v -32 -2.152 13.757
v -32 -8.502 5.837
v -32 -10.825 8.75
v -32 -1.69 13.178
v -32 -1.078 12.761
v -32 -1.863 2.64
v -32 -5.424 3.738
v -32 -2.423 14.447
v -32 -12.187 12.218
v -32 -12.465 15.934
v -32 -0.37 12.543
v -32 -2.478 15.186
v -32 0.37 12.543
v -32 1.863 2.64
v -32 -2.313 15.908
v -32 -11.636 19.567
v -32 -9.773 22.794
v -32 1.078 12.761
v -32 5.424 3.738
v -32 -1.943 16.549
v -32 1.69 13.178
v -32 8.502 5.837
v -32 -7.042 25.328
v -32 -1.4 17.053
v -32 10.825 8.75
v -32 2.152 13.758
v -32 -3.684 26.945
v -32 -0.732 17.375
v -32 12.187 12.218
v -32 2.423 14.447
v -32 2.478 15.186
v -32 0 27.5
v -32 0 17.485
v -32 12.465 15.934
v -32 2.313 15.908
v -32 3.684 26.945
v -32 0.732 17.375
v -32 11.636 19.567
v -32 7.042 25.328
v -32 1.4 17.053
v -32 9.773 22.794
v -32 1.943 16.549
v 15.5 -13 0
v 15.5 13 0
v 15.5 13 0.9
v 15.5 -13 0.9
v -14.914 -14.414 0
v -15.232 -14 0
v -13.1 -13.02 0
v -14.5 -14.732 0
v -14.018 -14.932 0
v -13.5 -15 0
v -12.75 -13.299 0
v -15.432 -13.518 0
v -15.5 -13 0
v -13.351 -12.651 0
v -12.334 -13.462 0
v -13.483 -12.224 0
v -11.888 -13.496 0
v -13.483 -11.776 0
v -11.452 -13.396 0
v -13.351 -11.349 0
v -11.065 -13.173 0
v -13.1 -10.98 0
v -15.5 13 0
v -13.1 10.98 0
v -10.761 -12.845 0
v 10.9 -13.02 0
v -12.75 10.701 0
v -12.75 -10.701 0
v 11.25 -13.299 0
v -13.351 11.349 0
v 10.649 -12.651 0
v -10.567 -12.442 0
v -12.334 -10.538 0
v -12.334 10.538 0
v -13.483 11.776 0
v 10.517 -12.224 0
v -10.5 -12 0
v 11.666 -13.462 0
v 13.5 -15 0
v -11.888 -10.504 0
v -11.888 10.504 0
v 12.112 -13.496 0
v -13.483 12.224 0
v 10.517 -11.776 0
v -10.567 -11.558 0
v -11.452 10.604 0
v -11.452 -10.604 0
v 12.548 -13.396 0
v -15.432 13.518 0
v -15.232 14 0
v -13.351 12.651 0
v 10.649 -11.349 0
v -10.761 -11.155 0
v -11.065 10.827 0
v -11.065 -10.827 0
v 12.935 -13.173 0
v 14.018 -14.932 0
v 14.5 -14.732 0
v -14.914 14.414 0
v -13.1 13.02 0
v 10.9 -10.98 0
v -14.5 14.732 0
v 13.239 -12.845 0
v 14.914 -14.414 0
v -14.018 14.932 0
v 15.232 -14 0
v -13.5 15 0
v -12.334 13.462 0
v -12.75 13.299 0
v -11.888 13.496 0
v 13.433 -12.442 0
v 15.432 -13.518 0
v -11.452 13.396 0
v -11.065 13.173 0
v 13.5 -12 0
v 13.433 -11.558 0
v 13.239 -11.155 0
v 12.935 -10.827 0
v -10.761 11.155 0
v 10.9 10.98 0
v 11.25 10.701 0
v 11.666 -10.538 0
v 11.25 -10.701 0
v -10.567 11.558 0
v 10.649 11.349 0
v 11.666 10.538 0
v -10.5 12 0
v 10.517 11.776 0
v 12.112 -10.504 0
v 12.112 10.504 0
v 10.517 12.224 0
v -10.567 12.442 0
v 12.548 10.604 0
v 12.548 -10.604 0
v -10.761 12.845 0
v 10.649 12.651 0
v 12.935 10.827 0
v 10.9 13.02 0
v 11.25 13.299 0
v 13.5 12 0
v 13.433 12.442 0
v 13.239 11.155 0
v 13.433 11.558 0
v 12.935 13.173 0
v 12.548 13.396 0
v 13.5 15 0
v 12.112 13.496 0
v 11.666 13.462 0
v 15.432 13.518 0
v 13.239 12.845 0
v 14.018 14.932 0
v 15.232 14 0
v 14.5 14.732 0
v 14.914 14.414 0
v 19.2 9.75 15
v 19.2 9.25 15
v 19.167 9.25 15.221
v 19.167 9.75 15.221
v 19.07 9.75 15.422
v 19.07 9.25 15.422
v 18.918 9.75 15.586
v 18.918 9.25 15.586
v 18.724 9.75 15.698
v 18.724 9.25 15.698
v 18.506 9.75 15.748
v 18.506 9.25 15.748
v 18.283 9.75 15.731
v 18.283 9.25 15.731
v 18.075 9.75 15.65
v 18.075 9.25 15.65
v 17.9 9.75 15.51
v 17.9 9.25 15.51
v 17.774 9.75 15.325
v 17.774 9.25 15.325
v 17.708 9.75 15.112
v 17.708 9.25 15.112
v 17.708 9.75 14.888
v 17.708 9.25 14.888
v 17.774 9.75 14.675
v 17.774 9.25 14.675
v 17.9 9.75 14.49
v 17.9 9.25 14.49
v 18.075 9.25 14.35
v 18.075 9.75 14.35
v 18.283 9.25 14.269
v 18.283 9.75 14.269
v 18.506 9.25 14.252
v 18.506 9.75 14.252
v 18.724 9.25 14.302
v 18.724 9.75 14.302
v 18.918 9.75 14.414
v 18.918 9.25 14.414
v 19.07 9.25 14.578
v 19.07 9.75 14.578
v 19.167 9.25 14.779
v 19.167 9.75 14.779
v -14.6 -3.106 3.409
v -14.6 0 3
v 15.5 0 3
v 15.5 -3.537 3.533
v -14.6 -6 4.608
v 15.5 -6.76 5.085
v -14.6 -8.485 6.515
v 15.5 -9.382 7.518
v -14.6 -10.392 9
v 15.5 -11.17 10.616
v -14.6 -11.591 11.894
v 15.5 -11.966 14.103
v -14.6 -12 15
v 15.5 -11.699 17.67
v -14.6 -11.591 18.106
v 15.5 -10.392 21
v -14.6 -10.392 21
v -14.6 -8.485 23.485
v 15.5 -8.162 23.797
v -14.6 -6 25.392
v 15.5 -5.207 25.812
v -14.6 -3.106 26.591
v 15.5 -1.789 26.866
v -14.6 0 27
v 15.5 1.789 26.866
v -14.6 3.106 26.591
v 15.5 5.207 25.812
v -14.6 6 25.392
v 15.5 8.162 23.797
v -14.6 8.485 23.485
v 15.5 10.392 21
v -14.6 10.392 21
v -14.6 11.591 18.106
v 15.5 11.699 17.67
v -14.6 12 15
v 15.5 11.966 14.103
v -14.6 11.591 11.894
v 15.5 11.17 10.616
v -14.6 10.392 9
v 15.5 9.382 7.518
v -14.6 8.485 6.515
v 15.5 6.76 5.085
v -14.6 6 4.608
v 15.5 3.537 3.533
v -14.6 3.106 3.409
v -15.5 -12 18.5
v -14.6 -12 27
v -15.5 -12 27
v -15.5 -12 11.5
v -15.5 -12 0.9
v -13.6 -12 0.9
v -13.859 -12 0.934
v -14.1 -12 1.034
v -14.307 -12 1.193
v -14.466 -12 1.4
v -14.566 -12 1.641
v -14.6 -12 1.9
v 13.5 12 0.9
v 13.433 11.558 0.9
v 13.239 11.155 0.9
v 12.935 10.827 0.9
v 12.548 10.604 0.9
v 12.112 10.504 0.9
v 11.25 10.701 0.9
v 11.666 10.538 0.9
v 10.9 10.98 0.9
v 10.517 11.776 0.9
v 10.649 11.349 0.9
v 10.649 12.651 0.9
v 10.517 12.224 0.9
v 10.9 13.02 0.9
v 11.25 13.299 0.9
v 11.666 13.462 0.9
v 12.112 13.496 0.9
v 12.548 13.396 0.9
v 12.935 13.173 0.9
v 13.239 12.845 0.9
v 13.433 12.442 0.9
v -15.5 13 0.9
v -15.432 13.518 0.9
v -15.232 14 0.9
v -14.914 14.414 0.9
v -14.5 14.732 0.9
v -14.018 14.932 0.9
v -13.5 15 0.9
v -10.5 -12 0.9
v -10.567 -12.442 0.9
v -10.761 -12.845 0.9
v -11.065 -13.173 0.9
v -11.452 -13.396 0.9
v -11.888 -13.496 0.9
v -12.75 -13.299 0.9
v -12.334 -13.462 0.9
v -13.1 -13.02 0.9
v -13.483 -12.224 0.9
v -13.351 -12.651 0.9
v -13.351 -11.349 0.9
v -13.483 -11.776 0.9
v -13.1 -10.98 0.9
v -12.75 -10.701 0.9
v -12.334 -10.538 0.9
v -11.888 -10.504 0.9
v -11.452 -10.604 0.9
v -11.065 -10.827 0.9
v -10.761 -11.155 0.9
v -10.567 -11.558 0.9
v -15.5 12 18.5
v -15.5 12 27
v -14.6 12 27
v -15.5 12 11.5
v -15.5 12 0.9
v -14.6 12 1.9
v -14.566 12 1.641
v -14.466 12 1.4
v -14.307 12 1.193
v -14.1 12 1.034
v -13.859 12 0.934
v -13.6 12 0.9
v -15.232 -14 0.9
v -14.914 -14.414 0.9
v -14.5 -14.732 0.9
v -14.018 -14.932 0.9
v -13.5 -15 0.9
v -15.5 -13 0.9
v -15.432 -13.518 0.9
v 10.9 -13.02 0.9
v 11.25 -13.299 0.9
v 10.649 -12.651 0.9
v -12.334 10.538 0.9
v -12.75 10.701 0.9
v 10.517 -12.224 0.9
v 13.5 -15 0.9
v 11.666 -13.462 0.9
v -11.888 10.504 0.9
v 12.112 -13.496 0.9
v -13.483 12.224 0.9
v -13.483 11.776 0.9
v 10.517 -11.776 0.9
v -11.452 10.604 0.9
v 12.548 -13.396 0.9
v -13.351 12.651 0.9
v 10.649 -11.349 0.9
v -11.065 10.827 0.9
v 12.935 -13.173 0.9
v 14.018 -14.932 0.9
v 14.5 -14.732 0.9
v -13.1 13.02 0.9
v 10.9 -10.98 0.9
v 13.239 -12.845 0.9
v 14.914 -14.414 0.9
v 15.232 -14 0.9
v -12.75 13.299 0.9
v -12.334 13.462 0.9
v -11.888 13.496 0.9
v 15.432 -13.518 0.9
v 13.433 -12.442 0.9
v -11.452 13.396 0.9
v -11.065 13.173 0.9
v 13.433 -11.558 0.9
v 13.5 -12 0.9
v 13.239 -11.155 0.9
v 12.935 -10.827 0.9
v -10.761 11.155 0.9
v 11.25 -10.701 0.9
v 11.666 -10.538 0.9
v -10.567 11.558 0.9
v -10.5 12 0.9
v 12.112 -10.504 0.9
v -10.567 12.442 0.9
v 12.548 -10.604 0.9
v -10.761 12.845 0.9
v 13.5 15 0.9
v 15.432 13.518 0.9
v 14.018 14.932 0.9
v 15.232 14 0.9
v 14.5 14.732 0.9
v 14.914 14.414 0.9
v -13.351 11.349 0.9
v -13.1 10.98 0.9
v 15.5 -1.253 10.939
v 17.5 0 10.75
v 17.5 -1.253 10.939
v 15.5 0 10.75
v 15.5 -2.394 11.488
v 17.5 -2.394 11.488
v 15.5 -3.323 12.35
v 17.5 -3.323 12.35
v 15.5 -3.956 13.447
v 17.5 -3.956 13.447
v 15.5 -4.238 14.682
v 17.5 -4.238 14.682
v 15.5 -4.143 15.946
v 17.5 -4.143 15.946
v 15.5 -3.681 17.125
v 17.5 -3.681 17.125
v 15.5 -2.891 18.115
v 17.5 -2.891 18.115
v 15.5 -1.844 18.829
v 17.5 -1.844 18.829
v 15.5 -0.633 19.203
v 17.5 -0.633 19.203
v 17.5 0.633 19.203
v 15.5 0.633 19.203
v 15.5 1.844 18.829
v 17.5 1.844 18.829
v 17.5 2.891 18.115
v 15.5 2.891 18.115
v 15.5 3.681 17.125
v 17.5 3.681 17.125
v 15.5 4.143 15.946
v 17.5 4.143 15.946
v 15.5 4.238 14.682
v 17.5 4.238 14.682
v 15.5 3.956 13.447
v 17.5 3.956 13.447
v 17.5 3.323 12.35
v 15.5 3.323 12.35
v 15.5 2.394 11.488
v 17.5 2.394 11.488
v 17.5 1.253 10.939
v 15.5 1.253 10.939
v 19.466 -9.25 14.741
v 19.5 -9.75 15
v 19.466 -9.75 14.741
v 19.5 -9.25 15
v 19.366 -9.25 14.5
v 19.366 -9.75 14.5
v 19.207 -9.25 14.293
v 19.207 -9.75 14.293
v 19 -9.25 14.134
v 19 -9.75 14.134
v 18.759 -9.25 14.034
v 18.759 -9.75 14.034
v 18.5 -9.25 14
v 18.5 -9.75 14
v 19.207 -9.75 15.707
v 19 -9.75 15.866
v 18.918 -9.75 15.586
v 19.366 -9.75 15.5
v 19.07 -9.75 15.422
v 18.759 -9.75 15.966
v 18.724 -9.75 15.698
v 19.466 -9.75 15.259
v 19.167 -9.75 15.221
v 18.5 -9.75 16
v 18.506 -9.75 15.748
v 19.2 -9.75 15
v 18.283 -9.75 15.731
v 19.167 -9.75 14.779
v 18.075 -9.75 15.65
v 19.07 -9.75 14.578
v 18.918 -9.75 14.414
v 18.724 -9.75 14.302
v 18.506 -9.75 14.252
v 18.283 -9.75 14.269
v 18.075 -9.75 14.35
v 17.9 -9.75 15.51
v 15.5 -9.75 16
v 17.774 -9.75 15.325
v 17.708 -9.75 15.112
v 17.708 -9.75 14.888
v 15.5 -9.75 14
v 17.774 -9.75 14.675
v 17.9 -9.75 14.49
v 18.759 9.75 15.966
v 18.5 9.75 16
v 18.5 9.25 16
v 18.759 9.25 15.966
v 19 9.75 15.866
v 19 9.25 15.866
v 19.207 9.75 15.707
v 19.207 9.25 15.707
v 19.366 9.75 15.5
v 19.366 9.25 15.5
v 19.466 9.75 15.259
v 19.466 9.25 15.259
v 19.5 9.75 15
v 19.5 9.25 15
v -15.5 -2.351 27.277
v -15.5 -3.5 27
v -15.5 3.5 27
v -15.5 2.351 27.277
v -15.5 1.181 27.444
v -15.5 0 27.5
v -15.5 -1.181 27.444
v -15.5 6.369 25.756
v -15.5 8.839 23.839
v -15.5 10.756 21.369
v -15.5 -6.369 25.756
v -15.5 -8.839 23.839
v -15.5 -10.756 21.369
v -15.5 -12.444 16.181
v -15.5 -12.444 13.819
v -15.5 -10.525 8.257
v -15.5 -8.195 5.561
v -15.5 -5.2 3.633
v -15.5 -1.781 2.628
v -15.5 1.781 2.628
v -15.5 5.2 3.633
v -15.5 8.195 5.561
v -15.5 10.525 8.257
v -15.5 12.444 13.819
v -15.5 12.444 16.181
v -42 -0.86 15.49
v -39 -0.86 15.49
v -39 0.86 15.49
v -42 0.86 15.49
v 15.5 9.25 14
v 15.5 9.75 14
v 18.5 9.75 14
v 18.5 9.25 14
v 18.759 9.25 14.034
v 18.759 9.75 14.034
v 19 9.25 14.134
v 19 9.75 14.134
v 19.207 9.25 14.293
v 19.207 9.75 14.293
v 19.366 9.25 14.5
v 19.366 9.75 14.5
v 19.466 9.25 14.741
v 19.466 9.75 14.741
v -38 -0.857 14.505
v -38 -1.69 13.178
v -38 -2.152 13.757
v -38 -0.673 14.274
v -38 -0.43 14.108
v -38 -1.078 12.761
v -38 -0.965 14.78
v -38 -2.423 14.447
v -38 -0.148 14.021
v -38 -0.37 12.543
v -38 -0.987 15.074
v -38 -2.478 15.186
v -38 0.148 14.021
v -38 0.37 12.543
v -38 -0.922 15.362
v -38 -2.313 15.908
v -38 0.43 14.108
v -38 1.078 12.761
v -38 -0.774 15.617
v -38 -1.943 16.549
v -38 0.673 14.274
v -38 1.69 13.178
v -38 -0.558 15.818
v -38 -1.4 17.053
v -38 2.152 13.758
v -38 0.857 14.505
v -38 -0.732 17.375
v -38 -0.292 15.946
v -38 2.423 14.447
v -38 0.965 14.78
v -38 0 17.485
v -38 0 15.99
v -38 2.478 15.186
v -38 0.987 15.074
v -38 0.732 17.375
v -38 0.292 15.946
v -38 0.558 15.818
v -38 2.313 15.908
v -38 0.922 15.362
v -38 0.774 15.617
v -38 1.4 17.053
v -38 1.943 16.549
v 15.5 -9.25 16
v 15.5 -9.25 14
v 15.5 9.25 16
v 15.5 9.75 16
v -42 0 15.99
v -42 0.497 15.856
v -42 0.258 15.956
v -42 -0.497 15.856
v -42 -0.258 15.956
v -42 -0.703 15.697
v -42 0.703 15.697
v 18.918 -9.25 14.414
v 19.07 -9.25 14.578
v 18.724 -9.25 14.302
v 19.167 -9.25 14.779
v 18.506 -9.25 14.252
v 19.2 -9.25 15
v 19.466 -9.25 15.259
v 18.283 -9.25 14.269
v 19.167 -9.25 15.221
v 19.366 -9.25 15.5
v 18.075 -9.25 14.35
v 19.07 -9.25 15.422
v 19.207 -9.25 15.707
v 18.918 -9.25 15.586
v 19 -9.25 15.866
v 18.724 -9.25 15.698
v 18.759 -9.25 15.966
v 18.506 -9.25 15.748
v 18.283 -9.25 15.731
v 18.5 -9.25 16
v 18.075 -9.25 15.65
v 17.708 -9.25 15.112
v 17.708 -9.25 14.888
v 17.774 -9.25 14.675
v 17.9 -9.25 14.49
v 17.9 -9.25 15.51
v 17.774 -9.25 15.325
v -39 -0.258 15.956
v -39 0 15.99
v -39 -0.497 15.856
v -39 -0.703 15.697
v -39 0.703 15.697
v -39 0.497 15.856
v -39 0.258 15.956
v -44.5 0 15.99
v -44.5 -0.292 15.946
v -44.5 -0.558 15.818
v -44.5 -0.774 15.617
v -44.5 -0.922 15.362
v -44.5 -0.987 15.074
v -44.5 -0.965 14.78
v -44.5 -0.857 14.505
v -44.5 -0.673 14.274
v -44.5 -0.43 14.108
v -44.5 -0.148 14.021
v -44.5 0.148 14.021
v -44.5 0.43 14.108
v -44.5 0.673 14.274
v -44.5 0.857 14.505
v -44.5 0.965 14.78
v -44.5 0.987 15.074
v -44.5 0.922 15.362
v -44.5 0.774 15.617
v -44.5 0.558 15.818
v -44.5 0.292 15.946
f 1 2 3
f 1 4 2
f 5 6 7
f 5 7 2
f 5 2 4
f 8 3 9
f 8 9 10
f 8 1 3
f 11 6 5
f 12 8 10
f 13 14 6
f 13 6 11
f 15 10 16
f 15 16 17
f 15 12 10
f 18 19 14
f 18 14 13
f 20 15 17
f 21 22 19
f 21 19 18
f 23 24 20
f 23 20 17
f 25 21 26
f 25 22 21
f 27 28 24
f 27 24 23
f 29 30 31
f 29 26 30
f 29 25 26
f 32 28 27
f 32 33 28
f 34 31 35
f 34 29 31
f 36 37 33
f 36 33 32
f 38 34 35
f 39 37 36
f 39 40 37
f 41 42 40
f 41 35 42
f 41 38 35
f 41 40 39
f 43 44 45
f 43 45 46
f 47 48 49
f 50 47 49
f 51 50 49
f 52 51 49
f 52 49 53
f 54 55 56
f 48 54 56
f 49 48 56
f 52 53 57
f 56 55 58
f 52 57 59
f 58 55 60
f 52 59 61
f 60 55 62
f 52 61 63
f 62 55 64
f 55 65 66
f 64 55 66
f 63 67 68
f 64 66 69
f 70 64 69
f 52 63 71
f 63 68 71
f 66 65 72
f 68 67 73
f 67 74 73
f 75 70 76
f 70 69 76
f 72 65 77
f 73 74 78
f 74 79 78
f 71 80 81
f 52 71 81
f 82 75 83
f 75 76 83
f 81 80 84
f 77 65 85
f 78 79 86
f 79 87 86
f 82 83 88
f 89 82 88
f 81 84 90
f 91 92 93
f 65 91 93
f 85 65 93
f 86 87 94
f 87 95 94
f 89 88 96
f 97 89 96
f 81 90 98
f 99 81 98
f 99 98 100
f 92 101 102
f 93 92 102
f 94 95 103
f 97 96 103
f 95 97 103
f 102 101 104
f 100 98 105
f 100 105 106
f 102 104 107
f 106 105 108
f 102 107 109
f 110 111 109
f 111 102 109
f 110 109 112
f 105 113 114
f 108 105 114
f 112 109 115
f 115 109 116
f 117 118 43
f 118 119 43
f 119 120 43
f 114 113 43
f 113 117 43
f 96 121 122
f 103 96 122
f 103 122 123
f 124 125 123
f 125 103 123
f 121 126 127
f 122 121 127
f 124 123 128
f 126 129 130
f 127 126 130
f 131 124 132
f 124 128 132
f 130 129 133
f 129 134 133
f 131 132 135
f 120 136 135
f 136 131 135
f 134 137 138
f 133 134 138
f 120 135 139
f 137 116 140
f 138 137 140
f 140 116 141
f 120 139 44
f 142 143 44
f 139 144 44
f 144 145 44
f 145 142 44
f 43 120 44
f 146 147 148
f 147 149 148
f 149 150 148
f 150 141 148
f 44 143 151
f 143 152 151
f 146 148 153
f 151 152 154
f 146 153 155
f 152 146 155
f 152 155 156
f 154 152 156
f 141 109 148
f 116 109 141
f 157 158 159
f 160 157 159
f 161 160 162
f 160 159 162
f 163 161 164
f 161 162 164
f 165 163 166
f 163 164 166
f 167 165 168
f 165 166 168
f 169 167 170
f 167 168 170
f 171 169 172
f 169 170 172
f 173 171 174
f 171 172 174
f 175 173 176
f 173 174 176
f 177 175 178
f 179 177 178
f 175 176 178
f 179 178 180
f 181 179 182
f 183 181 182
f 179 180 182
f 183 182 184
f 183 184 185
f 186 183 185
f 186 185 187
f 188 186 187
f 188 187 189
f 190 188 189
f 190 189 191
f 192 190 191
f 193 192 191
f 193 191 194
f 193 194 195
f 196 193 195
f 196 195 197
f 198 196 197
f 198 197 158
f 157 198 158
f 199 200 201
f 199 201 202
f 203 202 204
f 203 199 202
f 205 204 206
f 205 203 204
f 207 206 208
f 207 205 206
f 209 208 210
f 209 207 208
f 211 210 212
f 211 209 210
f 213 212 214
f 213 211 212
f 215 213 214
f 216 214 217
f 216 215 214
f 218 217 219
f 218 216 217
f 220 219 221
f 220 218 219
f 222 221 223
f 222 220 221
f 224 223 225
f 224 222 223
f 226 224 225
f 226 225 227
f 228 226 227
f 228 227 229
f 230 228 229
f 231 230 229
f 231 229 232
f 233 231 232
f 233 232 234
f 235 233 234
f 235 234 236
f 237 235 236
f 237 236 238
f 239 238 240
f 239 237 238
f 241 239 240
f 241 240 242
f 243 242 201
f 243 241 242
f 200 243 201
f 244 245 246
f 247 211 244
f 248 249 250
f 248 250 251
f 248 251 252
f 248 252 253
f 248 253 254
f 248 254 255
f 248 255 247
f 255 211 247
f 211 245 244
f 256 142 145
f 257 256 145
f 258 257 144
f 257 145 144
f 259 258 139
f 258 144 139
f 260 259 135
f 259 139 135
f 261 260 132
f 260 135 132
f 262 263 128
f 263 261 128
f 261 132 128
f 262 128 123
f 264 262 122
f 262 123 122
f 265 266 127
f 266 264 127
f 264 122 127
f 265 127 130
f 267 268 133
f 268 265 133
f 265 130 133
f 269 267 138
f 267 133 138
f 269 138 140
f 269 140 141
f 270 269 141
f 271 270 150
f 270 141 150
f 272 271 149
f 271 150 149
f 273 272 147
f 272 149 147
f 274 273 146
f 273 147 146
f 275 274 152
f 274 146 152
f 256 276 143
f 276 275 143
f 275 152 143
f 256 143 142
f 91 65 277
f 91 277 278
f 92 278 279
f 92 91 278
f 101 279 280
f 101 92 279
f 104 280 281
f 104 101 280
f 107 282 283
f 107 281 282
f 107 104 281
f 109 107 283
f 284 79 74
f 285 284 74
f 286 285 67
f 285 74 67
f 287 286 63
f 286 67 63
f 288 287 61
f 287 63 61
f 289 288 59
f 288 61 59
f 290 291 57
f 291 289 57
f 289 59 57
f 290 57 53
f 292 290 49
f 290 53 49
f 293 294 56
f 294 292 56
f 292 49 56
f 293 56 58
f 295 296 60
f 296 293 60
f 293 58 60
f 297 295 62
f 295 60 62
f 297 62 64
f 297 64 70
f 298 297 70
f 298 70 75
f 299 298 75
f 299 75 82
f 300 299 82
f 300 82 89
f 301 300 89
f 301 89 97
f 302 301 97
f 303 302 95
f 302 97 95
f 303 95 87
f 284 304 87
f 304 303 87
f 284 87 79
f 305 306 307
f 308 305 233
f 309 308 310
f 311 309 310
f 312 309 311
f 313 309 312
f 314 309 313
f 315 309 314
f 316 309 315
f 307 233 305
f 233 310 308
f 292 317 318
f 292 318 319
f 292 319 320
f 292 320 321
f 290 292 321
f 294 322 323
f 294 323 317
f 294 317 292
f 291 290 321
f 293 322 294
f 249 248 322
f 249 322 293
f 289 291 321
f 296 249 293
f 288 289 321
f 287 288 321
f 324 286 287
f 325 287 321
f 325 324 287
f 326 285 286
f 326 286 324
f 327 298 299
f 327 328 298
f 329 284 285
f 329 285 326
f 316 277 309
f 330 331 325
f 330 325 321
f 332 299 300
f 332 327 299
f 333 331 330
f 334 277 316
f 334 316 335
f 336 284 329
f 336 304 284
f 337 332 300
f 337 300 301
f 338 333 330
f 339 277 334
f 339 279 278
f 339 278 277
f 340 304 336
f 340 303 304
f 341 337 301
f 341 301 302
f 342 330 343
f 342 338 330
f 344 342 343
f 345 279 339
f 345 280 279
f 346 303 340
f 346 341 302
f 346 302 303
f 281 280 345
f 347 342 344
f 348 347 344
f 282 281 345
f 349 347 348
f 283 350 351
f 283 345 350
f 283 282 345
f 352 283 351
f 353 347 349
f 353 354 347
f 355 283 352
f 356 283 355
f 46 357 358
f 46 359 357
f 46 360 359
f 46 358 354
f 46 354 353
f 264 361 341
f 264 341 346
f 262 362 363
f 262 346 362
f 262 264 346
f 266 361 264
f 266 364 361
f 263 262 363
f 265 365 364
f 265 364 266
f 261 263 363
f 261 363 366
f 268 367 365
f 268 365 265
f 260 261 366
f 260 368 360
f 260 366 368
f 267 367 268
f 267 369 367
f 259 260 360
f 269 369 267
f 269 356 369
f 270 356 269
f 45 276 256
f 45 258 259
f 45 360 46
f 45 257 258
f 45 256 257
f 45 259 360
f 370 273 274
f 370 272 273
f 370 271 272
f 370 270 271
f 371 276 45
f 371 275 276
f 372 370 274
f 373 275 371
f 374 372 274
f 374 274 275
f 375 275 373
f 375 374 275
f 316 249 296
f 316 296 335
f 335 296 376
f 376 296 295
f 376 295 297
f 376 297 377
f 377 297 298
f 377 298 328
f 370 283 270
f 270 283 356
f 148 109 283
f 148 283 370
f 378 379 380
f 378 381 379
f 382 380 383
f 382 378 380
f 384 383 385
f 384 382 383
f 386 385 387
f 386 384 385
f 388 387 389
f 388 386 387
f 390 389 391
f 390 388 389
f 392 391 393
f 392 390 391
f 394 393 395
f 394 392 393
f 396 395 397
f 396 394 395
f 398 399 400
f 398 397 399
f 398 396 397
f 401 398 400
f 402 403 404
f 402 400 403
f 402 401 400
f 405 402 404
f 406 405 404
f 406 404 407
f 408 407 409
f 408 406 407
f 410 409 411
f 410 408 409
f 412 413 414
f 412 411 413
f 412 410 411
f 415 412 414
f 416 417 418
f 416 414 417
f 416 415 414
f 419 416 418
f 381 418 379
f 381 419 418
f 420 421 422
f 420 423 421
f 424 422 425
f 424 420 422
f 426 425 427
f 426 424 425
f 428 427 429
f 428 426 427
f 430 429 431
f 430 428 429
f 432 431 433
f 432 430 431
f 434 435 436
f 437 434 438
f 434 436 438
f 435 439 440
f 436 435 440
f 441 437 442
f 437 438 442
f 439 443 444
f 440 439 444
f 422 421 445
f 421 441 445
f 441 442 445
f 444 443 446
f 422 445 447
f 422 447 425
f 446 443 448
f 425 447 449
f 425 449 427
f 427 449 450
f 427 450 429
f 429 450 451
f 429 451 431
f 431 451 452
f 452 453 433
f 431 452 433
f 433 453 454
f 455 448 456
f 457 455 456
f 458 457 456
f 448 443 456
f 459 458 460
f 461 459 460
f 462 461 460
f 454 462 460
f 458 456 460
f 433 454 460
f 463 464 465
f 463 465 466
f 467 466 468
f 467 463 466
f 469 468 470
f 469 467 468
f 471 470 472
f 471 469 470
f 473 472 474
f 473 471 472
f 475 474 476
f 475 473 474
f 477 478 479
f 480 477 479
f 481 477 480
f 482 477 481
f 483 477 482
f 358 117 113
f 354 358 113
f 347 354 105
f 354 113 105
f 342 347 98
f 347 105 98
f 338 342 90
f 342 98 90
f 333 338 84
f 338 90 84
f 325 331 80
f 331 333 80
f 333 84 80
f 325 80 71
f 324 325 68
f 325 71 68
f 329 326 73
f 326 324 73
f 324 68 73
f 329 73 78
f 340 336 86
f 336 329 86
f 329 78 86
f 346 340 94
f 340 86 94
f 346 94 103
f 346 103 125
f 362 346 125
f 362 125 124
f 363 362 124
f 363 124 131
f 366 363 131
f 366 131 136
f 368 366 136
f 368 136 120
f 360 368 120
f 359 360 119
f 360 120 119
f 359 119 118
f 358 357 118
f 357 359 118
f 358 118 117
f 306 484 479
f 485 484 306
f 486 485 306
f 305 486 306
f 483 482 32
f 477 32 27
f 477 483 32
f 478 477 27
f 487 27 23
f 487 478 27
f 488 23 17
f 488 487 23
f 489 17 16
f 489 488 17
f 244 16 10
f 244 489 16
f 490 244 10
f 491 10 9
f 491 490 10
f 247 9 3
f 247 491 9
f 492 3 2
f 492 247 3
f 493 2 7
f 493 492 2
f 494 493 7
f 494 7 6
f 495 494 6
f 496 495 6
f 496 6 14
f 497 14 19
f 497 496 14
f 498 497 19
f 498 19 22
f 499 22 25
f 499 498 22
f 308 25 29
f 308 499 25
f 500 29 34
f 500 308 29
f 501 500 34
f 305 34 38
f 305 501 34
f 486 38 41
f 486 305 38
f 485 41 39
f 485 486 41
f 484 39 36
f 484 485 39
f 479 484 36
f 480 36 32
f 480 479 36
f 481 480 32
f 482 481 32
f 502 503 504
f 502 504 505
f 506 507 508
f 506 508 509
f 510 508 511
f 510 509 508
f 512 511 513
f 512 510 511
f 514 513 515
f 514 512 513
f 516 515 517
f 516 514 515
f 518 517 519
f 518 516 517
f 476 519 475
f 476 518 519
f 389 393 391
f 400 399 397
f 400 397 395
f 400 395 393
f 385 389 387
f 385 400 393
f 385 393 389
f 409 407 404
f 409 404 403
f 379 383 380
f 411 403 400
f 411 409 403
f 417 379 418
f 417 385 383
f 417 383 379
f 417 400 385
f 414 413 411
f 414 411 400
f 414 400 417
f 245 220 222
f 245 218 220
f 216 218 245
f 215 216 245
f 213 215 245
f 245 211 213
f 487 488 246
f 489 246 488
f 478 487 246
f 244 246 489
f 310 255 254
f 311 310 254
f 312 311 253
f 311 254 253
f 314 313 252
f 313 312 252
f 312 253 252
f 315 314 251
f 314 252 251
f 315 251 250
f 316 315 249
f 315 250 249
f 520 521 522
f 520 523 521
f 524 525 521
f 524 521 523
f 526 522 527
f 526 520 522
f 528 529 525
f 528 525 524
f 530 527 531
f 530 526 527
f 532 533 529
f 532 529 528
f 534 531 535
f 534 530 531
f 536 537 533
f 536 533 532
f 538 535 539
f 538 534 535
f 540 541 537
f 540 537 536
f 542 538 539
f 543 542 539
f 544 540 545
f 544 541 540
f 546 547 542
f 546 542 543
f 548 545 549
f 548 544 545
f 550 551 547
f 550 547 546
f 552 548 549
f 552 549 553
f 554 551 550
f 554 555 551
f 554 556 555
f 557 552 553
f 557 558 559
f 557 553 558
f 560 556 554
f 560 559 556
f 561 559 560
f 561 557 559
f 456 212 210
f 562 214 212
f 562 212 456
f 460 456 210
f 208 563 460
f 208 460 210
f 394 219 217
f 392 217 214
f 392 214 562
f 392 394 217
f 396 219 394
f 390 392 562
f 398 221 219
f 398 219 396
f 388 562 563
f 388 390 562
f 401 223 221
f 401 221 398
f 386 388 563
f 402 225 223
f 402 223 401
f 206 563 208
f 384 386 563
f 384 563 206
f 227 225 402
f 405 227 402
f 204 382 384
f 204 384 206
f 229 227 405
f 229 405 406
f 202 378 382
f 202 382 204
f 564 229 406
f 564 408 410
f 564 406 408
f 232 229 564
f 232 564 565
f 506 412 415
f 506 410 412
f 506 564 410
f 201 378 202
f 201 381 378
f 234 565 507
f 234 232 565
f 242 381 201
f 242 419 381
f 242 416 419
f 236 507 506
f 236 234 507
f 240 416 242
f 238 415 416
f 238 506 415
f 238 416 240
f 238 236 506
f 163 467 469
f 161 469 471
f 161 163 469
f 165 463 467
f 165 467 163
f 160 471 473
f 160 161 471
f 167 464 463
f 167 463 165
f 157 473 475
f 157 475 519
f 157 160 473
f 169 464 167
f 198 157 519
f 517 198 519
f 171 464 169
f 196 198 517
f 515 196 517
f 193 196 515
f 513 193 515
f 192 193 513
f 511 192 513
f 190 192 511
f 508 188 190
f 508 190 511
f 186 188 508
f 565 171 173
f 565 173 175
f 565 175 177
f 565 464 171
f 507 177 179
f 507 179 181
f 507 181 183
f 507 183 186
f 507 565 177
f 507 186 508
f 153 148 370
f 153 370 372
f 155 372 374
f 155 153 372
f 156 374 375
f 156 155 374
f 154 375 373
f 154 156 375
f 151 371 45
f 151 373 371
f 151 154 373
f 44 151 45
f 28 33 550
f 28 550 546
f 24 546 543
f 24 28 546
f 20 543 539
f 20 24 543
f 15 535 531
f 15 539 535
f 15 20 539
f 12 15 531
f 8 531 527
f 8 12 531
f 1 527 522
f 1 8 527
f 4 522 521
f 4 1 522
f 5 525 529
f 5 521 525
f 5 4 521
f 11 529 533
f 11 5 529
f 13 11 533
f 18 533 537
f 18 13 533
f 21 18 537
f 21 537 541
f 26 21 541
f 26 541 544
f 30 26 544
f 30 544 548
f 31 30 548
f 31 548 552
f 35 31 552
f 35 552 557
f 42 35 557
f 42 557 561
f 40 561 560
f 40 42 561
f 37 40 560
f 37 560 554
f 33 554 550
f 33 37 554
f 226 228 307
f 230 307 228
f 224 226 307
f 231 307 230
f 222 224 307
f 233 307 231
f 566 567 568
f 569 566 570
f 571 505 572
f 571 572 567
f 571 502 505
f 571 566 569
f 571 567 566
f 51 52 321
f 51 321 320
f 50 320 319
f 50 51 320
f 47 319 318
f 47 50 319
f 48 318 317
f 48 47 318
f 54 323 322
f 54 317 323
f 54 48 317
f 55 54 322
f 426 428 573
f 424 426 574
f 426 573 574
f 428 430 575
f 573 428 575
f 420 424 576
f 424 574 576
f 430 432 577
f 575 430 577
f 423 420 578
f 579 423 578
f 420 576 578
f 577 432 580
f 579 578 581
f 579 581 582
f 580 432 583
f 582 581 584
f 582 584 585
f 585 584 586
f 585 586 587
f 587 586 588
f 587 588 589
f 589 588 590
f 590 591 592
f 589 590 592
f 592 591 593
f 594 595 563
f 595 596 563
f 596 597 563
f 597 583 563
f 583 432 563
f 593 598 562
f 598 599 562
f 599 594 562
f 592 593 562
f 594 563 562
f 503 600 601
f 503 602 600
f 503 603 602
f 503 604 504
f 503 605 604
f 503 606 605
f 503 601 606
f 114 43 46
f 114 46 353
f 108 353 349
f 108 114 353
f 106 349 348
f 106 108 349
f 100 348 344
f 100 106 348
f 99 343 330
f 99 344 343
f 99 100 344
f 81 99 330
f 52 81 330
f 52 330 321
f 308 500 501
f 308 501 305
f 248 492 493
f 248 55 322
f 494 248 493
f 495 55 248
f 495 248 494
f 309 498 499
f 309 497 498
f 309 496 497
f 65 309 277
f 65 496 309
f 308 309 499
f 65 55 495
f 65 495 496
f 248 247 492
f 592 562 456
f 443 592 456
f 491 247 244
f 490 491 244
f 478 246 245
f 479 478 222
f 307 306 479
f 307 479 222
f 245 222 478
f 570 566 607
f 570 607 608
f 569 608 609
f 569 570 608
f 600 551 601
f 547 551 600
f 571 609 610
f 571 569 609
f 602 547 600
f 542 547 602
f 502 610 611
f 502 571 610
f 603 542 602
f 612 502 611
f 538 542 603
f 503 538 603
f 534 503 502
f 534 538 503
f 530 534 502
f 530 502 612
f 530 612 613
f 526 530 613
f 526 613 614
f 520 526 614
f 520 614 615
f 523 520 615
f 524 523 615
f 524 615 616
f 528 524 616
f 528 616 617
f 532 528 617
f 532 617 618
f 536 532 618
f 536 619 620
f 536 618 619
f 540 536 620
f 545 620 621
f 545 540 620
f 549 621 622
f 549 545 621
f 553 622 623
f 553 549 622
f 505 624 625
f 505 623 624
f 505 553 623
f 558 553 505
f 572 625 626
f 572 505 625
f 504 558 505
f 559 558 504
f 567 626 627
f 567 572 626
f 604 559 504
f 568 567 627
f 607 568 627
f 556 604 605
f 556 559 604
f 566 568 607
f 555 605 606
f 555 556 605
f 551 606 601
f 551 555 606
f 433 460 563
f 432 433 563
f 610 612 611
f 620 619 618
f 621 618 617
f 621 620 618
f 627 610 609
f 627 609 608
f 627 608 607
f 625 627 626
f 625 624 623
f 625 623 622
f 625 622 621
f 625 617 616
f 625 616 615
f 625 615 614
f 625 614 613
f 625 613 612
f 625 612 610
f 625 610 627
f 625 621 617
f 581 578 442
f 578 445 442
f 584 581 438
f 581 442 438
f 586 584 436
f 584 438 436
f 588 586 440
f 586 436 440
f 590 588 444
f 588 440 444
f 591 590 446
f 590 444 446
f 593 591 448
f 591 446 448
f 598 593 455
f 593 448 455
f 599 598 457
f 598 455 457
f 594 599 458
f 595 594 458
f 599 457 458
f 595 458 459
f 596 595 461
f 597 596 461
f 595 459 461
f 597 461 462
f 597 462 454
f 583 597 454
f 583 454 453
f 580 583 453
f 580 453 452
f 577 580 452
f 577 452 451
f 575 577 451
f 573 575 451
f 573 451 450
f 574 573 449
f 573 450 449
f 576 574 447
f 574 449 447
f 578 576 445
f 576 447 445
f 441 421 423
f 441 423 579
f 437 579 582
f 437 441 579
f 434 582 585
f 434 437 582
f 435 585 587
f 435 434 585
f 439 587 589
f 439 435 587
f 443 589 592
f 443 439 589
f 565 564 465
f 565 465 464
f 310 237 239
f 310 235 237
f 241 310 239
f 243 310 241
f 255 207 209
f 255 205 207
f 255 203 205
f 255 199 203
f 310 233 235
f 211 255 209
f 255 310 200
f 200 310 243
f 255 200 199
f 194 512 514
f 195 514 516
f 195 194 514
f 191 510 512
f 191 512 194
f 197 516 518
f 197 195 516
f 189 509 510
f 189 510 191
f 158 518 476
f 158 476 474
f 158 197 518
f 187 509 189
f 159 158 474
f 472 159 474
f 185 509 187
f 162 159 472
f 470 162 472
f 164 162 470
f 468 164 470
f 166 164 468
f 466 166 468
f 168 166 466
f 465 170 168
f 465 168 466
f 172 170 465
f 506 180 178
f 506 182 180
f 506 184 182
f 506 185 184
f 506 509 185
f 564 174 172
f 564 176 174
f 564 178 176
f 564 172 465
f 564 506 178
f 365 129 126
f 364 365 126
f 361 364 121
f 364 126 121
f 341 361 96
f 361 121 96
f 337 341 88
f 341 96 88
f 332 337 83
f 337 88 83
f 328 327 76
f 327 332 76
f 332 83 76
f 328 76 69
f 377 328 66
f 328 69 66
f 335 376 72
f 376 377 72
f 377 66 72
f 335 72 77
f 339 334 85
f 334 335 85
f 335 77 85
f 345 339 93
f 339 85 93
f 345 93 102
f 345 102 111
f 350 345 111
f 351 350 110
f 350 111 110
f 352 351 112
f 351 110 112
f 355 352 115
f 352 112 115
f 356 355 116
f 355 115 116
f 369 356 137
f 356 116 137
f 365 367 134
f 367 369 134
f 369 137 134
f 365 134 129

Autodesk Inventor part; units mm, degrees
ref_plane "YZ Plane" through (0, 0, 0) normal (1, 0, 0) x (0, 1, 0)
ref_plane "XZ Plane" through (0, 0, 0) normal (0, 1, 0) x (-1, 0, 0)
ref_plane "XY Plane" through (0, 0, 0) normal (0, 0, 1) x (1, 0, 0)
sketch "Sketch1" plane through (0, 0, 0) normal (0, 0, 1) x (1, 0, 0)
  line L0 (-13.5, 15) -> (13.5, 15)
  line L1 (15.5, 13) -> (15.5, -13)
  line L2 (13.5, -15) -> (-13.5, -15)
  line L3 (-15.5, -13) -> (-15.5, 13)
  line L4 (-22.2799, 0) -> (22.2799, 0) projected
  line L5 (0, -21.5799) -> (0, 21.5799) projected
  circle A0 centre (-12, 12) radius 1.5
  arc A1 (-13.5, 15) -> (-15.5, 13) centre (-13.5, 13) ccw
  arc A2 (15.5, 13) -> (13.5, 15) centre (13.5, 13) ccw
  arc A3 (13.5, -15) -> (15.5, -13) centre (13.5, -13) ccw
  arc A4 (-15.5, -13) -> (-13.5, -15) centre (-13.5, -13) ccw
  circle A5 centre (12, 12) radius 1.5
  circle A6 centre (-12, -12) radius 1.5
  circle A7 centre (12, -12) radius 1.5
  point P0 (0, 0)
  point P1 (-15.5, 15)
  point P2 (15.5, -15)
  point P3 (15.5, 15)
  point P4 (13.5, 13)
  dimension "d0" = 31
  dimension "d1" = 30
  dimension "d2" = 15
  dimension "d3" = 15.5
  dimension "d4" = 3
  dimension "d5" = 12
  dimension "d6" = 12
  dimension "d7" = 2
extrude "Extrusion1" add sketch "Sketch1" along normal blind 0.9
sketch "Sketch2" plane through (0, 0, 0.9) normal (0, 0, 1) x (1, 0, 0)
  circle A0 centre (12, -12) radius 1.5 projected
  circle A1 centre (-12, -12) radius 1.5 projected
  circle A2 centre (12, 12) radius 1.5 projected
  circle A3 centre (-12, 12) radius 1.5 projected
  line L0 (13.5, 15) -> (-13.5, 15) projected
  arc A4 (-13.5, 15) -> (-15.5, 13) centre (-13.5, 13) ccw projected
  line L1 (-15.5, 13) -> (-15.5, -13) projected
  arc A5 (-15.5, -13) -> (-13.5, -15) centre (-13.5, -13) ccw projected
  line L2 (-13.5, -15) -> (13.5, -15) projected
  arc A6 (13.5, -15) -> (15.5, -13) centre (13.5, -13) ccw projected
  line L3 (15.5, -13) -> (15.5, 13) projected
  arc A7 (15.5, 13) -> (13.5, 15) centre (13.5, 13) ccw projected
  line L4 (-15.5, 12) -> (-14.6, 12)
  line L5 (-14.6, 12) -> (-14.6, -12)
  line L6 (-14.6, -12) -> (-15.5, -12)
  line L7 (-15.5, -12) -> (-15.5, 12)
  line L8 (-22.2799, 0) -> (22.2799, 0) projected
  line L9 (0, -21.5799) -> (0, 21.5799) projected
  point P0 (0, 0)
  dimension "d10" = 0.9
  dimension "d11" = 24
  dimension "d12" = 12
extrude "Extrusion2" add sketch "Sketch2" along normal blind 26.1 contours L8 L1 L4 L5 | L5 L6 L1 L8
fillet "Fillet1" radius 1 1 edges at (-14.6, 0, 0.9)
sketch "Sketch3" plane through (-14.6, -12, 27) normal (1, 0, 0) x (0, 0, -1)
  line L0 (27, -1) -> (27, 25) projected
  line L1 (27, -1) -> (26.1, -1) projected
  line L2 (26.1, 0) -> (26.1, -1) projected
  line L3 (26.1, 0) -> (0, 0) projected
  line L4 (0, 24) -> (0, 0) projected
  line L5 (26.1, 24) -> (0, 24) projected
  line L6 (26.1, 25) -> (26.1, 24) projected
  line L7 (27, 25) -> (26.1, 25) projected
  line L8 (35.3744, 12) -> (2.9643, 12) construction
  circle A0 centre (12, 12) radius 12
  point P0 (27, 12)
  dimension "d16" = 15
  dimension "d17" = 24
extrude "Extrusion3" add sketch "Sketch3" along normal blind 30.1 contours A0
sketch "Sketch4" plane through (-15.5, -13, 0) normal (-1, 0, 0) x (0, 0, 1)
  circle A0 centre (15, 13) radius 12 projected
  arc A1 (15, 25) -> (15, 1) centre (15, 13) ccw projected
  arc A2 (27, 13) -> (15, 25) centre (15, 13) ccw projected
  arc A3 (15, 1) -> (27, 13) centre (15, 13) ccw projected
  circle A4 centre (15, 13) radius 12.5
  point P0 (0, 13)
  dimension "d20" = 25
extrude "Extrusion4" add sketch "Sketch4" along normal blind 16.5 contours A0 | A4
sketch "Sketch5" plane through (15.5, 0, 15) normal (1, 0, 0) x (0, 0, -1)
  circle A0 centre (0, 0) radius 12 projected
  arc A1 (0, -12) -> (0, 12) centre (0, 0) ccw projected
  arc A2 (0, 12) -> (-12, 0) centre (0, 0) ccw projected
  arc A3 (-12, 0) -> (0, -12) centre (0, 0) ccw projected
  circle A4 centre (0, 0) radius 4.25
  point P0 (15, 0)
  dimension "d23" = 8.5
extrude "Extrusion5" add sketch "Sketch5" along normal blind 2 contours A4
sketch "Sketch6" plane through (15.5, 0, 15) normal (1, 0, 0) x (0, 0, -1)
  circle A0 centre (0, 0) radius 12 projected
  arc A1 (0, -12) -> (0, 12) centre (0, 0) ccw projected
  arc A2 (0, 12) -> (-12, 0) centre (0, 0) ccw projected
  arc A3 (-12, 0) -> (0, -12) centre (0, 0) ccw projected
  line L0 (0, 12.481) -> (0, -10.3275) construction
  line L1 (-1, -9.75) -> (1, -9.75)
  line L2 (1, -9.75) -> (1, -9.25)
  line L3 (1, -9.25) -> (-1, -9.25)
  line L4 (-1, -9.25) -> (-1, -9.75)
  line L5 (0, 0) -> (-4.6495, 0) construction
  line L6 (-1, 9.75) -> (1, 9.75)
  line L7 (1, 9.75) -> (1, 9.25)
  line L8 (1, 9.25) -> (-1, 9.25)
  line L9 (-1, 9.25) -> (-1, 9.75)
  point P0 (15, 0)
  point P1 (0, 10.3275)
  dimension "d26" = 2
  dimension "d27" = 1
  dimension "d28" = 0.5
  dimension "d29" = 9.25
extrude "Extrusion6" add sketch "Sketch6" along normal blind 4 contours L4 L3 L2 L1 | L6 L7 L8 L9
sketch "Sketch7" plane through (15.5, -9.75, 14) normal (0, -1, 0) x (1, 0, 0)
  line L0 (0, 0) -> (0, 2) projected
  line L1 (0, 0) -> (4, 0) projected
  line L2 (4, 2) -> (4, 0) projected
  line L3 (0, 2) -> (4, 2) projected
  line L4 (4, 1) -> (0, 1) construction
  line L5 (0, 0) -> (0, 2) projected
  circle A0 centre (2.95, 1) radius 0.75
  point P0 (-15.5, -14)
  dimension "d32" = 1.5
  dimension "d33" = 1.05
extrude "Extrusion7" cut sketch "Sketch7" against normal through all contours A0
fillet "Fillet2" radius 1 2 edges at (19.5, -9.5, 16) (19.5, -9.5, 14)
fillet "Fillet3" radius 1 2 edges at (19.5, 9.5, 16) (19.5, 9.5, 14)
sketch "Sketch8" plane through (-32, 0, 15) normal (-1, 0, 0) x (0, 0, 1)
  circle A0 centre (0, 0) radius 12.5 projected
  circle A1 centre (0, 0) radius 2.485
  point P0 (-15, 0)
  dimension "d38" = 4.97
extrude "Extrusion8" add sketch "Sketch8" along normal blind 6 contours A1
sketch "Sketch9" plane through (-38, 0, 15) normal (-1, 0, 0) x (0, 0, 1)
  circle A0 centre (0, 0) radius 2.485 projected
  circle A1 centre (0, 0) radius 0.99
  point P0 (-15, 0)
  dimension "d41" = 1.98
extrude "Extrusion9" add sketch "Sketch9" along normal blind 6.5 contours A1
sketch "Sketch10" plane through (0, 0, 0) normal (0, 1, 0) x (-1, 0, 0)
  line L0 (44.5, 14.01) -> (44.5, 15.99) projected
  line L1 (38, 15.99) -> (38, 14.01) projected
  line L2 (42, 15.99) -> (39, 15.99)
  line L3 (39, 15.99) -> (39, 15.49)
  line L4 (39, 15.49) -> (42, 15.49)
  line L5 (42, 15.49) -> (42, 15.99)
  line L6 (38, 15.99) -> (44.5, 15.99) construction
  line L7 (38, 15.99) -> (44.5, 15.99) projected
  point P0 (0, 0)
  dimension "d44" = 3
  dimension "d45" = 0.5
  dimension "d46" = 1
extrude "Extrusion10" cut sketch "Sketch10" along normal mid plane 6.5
equation "\"d2\" = 0.5 * d1"
equation "\"d3\" = 0.5 * d0"
equation "\"d12\" = 0.5 * d11"
equation "\"d27\" = 0.5 * d26"
properties part number "BallBallancing_DCmotor"
